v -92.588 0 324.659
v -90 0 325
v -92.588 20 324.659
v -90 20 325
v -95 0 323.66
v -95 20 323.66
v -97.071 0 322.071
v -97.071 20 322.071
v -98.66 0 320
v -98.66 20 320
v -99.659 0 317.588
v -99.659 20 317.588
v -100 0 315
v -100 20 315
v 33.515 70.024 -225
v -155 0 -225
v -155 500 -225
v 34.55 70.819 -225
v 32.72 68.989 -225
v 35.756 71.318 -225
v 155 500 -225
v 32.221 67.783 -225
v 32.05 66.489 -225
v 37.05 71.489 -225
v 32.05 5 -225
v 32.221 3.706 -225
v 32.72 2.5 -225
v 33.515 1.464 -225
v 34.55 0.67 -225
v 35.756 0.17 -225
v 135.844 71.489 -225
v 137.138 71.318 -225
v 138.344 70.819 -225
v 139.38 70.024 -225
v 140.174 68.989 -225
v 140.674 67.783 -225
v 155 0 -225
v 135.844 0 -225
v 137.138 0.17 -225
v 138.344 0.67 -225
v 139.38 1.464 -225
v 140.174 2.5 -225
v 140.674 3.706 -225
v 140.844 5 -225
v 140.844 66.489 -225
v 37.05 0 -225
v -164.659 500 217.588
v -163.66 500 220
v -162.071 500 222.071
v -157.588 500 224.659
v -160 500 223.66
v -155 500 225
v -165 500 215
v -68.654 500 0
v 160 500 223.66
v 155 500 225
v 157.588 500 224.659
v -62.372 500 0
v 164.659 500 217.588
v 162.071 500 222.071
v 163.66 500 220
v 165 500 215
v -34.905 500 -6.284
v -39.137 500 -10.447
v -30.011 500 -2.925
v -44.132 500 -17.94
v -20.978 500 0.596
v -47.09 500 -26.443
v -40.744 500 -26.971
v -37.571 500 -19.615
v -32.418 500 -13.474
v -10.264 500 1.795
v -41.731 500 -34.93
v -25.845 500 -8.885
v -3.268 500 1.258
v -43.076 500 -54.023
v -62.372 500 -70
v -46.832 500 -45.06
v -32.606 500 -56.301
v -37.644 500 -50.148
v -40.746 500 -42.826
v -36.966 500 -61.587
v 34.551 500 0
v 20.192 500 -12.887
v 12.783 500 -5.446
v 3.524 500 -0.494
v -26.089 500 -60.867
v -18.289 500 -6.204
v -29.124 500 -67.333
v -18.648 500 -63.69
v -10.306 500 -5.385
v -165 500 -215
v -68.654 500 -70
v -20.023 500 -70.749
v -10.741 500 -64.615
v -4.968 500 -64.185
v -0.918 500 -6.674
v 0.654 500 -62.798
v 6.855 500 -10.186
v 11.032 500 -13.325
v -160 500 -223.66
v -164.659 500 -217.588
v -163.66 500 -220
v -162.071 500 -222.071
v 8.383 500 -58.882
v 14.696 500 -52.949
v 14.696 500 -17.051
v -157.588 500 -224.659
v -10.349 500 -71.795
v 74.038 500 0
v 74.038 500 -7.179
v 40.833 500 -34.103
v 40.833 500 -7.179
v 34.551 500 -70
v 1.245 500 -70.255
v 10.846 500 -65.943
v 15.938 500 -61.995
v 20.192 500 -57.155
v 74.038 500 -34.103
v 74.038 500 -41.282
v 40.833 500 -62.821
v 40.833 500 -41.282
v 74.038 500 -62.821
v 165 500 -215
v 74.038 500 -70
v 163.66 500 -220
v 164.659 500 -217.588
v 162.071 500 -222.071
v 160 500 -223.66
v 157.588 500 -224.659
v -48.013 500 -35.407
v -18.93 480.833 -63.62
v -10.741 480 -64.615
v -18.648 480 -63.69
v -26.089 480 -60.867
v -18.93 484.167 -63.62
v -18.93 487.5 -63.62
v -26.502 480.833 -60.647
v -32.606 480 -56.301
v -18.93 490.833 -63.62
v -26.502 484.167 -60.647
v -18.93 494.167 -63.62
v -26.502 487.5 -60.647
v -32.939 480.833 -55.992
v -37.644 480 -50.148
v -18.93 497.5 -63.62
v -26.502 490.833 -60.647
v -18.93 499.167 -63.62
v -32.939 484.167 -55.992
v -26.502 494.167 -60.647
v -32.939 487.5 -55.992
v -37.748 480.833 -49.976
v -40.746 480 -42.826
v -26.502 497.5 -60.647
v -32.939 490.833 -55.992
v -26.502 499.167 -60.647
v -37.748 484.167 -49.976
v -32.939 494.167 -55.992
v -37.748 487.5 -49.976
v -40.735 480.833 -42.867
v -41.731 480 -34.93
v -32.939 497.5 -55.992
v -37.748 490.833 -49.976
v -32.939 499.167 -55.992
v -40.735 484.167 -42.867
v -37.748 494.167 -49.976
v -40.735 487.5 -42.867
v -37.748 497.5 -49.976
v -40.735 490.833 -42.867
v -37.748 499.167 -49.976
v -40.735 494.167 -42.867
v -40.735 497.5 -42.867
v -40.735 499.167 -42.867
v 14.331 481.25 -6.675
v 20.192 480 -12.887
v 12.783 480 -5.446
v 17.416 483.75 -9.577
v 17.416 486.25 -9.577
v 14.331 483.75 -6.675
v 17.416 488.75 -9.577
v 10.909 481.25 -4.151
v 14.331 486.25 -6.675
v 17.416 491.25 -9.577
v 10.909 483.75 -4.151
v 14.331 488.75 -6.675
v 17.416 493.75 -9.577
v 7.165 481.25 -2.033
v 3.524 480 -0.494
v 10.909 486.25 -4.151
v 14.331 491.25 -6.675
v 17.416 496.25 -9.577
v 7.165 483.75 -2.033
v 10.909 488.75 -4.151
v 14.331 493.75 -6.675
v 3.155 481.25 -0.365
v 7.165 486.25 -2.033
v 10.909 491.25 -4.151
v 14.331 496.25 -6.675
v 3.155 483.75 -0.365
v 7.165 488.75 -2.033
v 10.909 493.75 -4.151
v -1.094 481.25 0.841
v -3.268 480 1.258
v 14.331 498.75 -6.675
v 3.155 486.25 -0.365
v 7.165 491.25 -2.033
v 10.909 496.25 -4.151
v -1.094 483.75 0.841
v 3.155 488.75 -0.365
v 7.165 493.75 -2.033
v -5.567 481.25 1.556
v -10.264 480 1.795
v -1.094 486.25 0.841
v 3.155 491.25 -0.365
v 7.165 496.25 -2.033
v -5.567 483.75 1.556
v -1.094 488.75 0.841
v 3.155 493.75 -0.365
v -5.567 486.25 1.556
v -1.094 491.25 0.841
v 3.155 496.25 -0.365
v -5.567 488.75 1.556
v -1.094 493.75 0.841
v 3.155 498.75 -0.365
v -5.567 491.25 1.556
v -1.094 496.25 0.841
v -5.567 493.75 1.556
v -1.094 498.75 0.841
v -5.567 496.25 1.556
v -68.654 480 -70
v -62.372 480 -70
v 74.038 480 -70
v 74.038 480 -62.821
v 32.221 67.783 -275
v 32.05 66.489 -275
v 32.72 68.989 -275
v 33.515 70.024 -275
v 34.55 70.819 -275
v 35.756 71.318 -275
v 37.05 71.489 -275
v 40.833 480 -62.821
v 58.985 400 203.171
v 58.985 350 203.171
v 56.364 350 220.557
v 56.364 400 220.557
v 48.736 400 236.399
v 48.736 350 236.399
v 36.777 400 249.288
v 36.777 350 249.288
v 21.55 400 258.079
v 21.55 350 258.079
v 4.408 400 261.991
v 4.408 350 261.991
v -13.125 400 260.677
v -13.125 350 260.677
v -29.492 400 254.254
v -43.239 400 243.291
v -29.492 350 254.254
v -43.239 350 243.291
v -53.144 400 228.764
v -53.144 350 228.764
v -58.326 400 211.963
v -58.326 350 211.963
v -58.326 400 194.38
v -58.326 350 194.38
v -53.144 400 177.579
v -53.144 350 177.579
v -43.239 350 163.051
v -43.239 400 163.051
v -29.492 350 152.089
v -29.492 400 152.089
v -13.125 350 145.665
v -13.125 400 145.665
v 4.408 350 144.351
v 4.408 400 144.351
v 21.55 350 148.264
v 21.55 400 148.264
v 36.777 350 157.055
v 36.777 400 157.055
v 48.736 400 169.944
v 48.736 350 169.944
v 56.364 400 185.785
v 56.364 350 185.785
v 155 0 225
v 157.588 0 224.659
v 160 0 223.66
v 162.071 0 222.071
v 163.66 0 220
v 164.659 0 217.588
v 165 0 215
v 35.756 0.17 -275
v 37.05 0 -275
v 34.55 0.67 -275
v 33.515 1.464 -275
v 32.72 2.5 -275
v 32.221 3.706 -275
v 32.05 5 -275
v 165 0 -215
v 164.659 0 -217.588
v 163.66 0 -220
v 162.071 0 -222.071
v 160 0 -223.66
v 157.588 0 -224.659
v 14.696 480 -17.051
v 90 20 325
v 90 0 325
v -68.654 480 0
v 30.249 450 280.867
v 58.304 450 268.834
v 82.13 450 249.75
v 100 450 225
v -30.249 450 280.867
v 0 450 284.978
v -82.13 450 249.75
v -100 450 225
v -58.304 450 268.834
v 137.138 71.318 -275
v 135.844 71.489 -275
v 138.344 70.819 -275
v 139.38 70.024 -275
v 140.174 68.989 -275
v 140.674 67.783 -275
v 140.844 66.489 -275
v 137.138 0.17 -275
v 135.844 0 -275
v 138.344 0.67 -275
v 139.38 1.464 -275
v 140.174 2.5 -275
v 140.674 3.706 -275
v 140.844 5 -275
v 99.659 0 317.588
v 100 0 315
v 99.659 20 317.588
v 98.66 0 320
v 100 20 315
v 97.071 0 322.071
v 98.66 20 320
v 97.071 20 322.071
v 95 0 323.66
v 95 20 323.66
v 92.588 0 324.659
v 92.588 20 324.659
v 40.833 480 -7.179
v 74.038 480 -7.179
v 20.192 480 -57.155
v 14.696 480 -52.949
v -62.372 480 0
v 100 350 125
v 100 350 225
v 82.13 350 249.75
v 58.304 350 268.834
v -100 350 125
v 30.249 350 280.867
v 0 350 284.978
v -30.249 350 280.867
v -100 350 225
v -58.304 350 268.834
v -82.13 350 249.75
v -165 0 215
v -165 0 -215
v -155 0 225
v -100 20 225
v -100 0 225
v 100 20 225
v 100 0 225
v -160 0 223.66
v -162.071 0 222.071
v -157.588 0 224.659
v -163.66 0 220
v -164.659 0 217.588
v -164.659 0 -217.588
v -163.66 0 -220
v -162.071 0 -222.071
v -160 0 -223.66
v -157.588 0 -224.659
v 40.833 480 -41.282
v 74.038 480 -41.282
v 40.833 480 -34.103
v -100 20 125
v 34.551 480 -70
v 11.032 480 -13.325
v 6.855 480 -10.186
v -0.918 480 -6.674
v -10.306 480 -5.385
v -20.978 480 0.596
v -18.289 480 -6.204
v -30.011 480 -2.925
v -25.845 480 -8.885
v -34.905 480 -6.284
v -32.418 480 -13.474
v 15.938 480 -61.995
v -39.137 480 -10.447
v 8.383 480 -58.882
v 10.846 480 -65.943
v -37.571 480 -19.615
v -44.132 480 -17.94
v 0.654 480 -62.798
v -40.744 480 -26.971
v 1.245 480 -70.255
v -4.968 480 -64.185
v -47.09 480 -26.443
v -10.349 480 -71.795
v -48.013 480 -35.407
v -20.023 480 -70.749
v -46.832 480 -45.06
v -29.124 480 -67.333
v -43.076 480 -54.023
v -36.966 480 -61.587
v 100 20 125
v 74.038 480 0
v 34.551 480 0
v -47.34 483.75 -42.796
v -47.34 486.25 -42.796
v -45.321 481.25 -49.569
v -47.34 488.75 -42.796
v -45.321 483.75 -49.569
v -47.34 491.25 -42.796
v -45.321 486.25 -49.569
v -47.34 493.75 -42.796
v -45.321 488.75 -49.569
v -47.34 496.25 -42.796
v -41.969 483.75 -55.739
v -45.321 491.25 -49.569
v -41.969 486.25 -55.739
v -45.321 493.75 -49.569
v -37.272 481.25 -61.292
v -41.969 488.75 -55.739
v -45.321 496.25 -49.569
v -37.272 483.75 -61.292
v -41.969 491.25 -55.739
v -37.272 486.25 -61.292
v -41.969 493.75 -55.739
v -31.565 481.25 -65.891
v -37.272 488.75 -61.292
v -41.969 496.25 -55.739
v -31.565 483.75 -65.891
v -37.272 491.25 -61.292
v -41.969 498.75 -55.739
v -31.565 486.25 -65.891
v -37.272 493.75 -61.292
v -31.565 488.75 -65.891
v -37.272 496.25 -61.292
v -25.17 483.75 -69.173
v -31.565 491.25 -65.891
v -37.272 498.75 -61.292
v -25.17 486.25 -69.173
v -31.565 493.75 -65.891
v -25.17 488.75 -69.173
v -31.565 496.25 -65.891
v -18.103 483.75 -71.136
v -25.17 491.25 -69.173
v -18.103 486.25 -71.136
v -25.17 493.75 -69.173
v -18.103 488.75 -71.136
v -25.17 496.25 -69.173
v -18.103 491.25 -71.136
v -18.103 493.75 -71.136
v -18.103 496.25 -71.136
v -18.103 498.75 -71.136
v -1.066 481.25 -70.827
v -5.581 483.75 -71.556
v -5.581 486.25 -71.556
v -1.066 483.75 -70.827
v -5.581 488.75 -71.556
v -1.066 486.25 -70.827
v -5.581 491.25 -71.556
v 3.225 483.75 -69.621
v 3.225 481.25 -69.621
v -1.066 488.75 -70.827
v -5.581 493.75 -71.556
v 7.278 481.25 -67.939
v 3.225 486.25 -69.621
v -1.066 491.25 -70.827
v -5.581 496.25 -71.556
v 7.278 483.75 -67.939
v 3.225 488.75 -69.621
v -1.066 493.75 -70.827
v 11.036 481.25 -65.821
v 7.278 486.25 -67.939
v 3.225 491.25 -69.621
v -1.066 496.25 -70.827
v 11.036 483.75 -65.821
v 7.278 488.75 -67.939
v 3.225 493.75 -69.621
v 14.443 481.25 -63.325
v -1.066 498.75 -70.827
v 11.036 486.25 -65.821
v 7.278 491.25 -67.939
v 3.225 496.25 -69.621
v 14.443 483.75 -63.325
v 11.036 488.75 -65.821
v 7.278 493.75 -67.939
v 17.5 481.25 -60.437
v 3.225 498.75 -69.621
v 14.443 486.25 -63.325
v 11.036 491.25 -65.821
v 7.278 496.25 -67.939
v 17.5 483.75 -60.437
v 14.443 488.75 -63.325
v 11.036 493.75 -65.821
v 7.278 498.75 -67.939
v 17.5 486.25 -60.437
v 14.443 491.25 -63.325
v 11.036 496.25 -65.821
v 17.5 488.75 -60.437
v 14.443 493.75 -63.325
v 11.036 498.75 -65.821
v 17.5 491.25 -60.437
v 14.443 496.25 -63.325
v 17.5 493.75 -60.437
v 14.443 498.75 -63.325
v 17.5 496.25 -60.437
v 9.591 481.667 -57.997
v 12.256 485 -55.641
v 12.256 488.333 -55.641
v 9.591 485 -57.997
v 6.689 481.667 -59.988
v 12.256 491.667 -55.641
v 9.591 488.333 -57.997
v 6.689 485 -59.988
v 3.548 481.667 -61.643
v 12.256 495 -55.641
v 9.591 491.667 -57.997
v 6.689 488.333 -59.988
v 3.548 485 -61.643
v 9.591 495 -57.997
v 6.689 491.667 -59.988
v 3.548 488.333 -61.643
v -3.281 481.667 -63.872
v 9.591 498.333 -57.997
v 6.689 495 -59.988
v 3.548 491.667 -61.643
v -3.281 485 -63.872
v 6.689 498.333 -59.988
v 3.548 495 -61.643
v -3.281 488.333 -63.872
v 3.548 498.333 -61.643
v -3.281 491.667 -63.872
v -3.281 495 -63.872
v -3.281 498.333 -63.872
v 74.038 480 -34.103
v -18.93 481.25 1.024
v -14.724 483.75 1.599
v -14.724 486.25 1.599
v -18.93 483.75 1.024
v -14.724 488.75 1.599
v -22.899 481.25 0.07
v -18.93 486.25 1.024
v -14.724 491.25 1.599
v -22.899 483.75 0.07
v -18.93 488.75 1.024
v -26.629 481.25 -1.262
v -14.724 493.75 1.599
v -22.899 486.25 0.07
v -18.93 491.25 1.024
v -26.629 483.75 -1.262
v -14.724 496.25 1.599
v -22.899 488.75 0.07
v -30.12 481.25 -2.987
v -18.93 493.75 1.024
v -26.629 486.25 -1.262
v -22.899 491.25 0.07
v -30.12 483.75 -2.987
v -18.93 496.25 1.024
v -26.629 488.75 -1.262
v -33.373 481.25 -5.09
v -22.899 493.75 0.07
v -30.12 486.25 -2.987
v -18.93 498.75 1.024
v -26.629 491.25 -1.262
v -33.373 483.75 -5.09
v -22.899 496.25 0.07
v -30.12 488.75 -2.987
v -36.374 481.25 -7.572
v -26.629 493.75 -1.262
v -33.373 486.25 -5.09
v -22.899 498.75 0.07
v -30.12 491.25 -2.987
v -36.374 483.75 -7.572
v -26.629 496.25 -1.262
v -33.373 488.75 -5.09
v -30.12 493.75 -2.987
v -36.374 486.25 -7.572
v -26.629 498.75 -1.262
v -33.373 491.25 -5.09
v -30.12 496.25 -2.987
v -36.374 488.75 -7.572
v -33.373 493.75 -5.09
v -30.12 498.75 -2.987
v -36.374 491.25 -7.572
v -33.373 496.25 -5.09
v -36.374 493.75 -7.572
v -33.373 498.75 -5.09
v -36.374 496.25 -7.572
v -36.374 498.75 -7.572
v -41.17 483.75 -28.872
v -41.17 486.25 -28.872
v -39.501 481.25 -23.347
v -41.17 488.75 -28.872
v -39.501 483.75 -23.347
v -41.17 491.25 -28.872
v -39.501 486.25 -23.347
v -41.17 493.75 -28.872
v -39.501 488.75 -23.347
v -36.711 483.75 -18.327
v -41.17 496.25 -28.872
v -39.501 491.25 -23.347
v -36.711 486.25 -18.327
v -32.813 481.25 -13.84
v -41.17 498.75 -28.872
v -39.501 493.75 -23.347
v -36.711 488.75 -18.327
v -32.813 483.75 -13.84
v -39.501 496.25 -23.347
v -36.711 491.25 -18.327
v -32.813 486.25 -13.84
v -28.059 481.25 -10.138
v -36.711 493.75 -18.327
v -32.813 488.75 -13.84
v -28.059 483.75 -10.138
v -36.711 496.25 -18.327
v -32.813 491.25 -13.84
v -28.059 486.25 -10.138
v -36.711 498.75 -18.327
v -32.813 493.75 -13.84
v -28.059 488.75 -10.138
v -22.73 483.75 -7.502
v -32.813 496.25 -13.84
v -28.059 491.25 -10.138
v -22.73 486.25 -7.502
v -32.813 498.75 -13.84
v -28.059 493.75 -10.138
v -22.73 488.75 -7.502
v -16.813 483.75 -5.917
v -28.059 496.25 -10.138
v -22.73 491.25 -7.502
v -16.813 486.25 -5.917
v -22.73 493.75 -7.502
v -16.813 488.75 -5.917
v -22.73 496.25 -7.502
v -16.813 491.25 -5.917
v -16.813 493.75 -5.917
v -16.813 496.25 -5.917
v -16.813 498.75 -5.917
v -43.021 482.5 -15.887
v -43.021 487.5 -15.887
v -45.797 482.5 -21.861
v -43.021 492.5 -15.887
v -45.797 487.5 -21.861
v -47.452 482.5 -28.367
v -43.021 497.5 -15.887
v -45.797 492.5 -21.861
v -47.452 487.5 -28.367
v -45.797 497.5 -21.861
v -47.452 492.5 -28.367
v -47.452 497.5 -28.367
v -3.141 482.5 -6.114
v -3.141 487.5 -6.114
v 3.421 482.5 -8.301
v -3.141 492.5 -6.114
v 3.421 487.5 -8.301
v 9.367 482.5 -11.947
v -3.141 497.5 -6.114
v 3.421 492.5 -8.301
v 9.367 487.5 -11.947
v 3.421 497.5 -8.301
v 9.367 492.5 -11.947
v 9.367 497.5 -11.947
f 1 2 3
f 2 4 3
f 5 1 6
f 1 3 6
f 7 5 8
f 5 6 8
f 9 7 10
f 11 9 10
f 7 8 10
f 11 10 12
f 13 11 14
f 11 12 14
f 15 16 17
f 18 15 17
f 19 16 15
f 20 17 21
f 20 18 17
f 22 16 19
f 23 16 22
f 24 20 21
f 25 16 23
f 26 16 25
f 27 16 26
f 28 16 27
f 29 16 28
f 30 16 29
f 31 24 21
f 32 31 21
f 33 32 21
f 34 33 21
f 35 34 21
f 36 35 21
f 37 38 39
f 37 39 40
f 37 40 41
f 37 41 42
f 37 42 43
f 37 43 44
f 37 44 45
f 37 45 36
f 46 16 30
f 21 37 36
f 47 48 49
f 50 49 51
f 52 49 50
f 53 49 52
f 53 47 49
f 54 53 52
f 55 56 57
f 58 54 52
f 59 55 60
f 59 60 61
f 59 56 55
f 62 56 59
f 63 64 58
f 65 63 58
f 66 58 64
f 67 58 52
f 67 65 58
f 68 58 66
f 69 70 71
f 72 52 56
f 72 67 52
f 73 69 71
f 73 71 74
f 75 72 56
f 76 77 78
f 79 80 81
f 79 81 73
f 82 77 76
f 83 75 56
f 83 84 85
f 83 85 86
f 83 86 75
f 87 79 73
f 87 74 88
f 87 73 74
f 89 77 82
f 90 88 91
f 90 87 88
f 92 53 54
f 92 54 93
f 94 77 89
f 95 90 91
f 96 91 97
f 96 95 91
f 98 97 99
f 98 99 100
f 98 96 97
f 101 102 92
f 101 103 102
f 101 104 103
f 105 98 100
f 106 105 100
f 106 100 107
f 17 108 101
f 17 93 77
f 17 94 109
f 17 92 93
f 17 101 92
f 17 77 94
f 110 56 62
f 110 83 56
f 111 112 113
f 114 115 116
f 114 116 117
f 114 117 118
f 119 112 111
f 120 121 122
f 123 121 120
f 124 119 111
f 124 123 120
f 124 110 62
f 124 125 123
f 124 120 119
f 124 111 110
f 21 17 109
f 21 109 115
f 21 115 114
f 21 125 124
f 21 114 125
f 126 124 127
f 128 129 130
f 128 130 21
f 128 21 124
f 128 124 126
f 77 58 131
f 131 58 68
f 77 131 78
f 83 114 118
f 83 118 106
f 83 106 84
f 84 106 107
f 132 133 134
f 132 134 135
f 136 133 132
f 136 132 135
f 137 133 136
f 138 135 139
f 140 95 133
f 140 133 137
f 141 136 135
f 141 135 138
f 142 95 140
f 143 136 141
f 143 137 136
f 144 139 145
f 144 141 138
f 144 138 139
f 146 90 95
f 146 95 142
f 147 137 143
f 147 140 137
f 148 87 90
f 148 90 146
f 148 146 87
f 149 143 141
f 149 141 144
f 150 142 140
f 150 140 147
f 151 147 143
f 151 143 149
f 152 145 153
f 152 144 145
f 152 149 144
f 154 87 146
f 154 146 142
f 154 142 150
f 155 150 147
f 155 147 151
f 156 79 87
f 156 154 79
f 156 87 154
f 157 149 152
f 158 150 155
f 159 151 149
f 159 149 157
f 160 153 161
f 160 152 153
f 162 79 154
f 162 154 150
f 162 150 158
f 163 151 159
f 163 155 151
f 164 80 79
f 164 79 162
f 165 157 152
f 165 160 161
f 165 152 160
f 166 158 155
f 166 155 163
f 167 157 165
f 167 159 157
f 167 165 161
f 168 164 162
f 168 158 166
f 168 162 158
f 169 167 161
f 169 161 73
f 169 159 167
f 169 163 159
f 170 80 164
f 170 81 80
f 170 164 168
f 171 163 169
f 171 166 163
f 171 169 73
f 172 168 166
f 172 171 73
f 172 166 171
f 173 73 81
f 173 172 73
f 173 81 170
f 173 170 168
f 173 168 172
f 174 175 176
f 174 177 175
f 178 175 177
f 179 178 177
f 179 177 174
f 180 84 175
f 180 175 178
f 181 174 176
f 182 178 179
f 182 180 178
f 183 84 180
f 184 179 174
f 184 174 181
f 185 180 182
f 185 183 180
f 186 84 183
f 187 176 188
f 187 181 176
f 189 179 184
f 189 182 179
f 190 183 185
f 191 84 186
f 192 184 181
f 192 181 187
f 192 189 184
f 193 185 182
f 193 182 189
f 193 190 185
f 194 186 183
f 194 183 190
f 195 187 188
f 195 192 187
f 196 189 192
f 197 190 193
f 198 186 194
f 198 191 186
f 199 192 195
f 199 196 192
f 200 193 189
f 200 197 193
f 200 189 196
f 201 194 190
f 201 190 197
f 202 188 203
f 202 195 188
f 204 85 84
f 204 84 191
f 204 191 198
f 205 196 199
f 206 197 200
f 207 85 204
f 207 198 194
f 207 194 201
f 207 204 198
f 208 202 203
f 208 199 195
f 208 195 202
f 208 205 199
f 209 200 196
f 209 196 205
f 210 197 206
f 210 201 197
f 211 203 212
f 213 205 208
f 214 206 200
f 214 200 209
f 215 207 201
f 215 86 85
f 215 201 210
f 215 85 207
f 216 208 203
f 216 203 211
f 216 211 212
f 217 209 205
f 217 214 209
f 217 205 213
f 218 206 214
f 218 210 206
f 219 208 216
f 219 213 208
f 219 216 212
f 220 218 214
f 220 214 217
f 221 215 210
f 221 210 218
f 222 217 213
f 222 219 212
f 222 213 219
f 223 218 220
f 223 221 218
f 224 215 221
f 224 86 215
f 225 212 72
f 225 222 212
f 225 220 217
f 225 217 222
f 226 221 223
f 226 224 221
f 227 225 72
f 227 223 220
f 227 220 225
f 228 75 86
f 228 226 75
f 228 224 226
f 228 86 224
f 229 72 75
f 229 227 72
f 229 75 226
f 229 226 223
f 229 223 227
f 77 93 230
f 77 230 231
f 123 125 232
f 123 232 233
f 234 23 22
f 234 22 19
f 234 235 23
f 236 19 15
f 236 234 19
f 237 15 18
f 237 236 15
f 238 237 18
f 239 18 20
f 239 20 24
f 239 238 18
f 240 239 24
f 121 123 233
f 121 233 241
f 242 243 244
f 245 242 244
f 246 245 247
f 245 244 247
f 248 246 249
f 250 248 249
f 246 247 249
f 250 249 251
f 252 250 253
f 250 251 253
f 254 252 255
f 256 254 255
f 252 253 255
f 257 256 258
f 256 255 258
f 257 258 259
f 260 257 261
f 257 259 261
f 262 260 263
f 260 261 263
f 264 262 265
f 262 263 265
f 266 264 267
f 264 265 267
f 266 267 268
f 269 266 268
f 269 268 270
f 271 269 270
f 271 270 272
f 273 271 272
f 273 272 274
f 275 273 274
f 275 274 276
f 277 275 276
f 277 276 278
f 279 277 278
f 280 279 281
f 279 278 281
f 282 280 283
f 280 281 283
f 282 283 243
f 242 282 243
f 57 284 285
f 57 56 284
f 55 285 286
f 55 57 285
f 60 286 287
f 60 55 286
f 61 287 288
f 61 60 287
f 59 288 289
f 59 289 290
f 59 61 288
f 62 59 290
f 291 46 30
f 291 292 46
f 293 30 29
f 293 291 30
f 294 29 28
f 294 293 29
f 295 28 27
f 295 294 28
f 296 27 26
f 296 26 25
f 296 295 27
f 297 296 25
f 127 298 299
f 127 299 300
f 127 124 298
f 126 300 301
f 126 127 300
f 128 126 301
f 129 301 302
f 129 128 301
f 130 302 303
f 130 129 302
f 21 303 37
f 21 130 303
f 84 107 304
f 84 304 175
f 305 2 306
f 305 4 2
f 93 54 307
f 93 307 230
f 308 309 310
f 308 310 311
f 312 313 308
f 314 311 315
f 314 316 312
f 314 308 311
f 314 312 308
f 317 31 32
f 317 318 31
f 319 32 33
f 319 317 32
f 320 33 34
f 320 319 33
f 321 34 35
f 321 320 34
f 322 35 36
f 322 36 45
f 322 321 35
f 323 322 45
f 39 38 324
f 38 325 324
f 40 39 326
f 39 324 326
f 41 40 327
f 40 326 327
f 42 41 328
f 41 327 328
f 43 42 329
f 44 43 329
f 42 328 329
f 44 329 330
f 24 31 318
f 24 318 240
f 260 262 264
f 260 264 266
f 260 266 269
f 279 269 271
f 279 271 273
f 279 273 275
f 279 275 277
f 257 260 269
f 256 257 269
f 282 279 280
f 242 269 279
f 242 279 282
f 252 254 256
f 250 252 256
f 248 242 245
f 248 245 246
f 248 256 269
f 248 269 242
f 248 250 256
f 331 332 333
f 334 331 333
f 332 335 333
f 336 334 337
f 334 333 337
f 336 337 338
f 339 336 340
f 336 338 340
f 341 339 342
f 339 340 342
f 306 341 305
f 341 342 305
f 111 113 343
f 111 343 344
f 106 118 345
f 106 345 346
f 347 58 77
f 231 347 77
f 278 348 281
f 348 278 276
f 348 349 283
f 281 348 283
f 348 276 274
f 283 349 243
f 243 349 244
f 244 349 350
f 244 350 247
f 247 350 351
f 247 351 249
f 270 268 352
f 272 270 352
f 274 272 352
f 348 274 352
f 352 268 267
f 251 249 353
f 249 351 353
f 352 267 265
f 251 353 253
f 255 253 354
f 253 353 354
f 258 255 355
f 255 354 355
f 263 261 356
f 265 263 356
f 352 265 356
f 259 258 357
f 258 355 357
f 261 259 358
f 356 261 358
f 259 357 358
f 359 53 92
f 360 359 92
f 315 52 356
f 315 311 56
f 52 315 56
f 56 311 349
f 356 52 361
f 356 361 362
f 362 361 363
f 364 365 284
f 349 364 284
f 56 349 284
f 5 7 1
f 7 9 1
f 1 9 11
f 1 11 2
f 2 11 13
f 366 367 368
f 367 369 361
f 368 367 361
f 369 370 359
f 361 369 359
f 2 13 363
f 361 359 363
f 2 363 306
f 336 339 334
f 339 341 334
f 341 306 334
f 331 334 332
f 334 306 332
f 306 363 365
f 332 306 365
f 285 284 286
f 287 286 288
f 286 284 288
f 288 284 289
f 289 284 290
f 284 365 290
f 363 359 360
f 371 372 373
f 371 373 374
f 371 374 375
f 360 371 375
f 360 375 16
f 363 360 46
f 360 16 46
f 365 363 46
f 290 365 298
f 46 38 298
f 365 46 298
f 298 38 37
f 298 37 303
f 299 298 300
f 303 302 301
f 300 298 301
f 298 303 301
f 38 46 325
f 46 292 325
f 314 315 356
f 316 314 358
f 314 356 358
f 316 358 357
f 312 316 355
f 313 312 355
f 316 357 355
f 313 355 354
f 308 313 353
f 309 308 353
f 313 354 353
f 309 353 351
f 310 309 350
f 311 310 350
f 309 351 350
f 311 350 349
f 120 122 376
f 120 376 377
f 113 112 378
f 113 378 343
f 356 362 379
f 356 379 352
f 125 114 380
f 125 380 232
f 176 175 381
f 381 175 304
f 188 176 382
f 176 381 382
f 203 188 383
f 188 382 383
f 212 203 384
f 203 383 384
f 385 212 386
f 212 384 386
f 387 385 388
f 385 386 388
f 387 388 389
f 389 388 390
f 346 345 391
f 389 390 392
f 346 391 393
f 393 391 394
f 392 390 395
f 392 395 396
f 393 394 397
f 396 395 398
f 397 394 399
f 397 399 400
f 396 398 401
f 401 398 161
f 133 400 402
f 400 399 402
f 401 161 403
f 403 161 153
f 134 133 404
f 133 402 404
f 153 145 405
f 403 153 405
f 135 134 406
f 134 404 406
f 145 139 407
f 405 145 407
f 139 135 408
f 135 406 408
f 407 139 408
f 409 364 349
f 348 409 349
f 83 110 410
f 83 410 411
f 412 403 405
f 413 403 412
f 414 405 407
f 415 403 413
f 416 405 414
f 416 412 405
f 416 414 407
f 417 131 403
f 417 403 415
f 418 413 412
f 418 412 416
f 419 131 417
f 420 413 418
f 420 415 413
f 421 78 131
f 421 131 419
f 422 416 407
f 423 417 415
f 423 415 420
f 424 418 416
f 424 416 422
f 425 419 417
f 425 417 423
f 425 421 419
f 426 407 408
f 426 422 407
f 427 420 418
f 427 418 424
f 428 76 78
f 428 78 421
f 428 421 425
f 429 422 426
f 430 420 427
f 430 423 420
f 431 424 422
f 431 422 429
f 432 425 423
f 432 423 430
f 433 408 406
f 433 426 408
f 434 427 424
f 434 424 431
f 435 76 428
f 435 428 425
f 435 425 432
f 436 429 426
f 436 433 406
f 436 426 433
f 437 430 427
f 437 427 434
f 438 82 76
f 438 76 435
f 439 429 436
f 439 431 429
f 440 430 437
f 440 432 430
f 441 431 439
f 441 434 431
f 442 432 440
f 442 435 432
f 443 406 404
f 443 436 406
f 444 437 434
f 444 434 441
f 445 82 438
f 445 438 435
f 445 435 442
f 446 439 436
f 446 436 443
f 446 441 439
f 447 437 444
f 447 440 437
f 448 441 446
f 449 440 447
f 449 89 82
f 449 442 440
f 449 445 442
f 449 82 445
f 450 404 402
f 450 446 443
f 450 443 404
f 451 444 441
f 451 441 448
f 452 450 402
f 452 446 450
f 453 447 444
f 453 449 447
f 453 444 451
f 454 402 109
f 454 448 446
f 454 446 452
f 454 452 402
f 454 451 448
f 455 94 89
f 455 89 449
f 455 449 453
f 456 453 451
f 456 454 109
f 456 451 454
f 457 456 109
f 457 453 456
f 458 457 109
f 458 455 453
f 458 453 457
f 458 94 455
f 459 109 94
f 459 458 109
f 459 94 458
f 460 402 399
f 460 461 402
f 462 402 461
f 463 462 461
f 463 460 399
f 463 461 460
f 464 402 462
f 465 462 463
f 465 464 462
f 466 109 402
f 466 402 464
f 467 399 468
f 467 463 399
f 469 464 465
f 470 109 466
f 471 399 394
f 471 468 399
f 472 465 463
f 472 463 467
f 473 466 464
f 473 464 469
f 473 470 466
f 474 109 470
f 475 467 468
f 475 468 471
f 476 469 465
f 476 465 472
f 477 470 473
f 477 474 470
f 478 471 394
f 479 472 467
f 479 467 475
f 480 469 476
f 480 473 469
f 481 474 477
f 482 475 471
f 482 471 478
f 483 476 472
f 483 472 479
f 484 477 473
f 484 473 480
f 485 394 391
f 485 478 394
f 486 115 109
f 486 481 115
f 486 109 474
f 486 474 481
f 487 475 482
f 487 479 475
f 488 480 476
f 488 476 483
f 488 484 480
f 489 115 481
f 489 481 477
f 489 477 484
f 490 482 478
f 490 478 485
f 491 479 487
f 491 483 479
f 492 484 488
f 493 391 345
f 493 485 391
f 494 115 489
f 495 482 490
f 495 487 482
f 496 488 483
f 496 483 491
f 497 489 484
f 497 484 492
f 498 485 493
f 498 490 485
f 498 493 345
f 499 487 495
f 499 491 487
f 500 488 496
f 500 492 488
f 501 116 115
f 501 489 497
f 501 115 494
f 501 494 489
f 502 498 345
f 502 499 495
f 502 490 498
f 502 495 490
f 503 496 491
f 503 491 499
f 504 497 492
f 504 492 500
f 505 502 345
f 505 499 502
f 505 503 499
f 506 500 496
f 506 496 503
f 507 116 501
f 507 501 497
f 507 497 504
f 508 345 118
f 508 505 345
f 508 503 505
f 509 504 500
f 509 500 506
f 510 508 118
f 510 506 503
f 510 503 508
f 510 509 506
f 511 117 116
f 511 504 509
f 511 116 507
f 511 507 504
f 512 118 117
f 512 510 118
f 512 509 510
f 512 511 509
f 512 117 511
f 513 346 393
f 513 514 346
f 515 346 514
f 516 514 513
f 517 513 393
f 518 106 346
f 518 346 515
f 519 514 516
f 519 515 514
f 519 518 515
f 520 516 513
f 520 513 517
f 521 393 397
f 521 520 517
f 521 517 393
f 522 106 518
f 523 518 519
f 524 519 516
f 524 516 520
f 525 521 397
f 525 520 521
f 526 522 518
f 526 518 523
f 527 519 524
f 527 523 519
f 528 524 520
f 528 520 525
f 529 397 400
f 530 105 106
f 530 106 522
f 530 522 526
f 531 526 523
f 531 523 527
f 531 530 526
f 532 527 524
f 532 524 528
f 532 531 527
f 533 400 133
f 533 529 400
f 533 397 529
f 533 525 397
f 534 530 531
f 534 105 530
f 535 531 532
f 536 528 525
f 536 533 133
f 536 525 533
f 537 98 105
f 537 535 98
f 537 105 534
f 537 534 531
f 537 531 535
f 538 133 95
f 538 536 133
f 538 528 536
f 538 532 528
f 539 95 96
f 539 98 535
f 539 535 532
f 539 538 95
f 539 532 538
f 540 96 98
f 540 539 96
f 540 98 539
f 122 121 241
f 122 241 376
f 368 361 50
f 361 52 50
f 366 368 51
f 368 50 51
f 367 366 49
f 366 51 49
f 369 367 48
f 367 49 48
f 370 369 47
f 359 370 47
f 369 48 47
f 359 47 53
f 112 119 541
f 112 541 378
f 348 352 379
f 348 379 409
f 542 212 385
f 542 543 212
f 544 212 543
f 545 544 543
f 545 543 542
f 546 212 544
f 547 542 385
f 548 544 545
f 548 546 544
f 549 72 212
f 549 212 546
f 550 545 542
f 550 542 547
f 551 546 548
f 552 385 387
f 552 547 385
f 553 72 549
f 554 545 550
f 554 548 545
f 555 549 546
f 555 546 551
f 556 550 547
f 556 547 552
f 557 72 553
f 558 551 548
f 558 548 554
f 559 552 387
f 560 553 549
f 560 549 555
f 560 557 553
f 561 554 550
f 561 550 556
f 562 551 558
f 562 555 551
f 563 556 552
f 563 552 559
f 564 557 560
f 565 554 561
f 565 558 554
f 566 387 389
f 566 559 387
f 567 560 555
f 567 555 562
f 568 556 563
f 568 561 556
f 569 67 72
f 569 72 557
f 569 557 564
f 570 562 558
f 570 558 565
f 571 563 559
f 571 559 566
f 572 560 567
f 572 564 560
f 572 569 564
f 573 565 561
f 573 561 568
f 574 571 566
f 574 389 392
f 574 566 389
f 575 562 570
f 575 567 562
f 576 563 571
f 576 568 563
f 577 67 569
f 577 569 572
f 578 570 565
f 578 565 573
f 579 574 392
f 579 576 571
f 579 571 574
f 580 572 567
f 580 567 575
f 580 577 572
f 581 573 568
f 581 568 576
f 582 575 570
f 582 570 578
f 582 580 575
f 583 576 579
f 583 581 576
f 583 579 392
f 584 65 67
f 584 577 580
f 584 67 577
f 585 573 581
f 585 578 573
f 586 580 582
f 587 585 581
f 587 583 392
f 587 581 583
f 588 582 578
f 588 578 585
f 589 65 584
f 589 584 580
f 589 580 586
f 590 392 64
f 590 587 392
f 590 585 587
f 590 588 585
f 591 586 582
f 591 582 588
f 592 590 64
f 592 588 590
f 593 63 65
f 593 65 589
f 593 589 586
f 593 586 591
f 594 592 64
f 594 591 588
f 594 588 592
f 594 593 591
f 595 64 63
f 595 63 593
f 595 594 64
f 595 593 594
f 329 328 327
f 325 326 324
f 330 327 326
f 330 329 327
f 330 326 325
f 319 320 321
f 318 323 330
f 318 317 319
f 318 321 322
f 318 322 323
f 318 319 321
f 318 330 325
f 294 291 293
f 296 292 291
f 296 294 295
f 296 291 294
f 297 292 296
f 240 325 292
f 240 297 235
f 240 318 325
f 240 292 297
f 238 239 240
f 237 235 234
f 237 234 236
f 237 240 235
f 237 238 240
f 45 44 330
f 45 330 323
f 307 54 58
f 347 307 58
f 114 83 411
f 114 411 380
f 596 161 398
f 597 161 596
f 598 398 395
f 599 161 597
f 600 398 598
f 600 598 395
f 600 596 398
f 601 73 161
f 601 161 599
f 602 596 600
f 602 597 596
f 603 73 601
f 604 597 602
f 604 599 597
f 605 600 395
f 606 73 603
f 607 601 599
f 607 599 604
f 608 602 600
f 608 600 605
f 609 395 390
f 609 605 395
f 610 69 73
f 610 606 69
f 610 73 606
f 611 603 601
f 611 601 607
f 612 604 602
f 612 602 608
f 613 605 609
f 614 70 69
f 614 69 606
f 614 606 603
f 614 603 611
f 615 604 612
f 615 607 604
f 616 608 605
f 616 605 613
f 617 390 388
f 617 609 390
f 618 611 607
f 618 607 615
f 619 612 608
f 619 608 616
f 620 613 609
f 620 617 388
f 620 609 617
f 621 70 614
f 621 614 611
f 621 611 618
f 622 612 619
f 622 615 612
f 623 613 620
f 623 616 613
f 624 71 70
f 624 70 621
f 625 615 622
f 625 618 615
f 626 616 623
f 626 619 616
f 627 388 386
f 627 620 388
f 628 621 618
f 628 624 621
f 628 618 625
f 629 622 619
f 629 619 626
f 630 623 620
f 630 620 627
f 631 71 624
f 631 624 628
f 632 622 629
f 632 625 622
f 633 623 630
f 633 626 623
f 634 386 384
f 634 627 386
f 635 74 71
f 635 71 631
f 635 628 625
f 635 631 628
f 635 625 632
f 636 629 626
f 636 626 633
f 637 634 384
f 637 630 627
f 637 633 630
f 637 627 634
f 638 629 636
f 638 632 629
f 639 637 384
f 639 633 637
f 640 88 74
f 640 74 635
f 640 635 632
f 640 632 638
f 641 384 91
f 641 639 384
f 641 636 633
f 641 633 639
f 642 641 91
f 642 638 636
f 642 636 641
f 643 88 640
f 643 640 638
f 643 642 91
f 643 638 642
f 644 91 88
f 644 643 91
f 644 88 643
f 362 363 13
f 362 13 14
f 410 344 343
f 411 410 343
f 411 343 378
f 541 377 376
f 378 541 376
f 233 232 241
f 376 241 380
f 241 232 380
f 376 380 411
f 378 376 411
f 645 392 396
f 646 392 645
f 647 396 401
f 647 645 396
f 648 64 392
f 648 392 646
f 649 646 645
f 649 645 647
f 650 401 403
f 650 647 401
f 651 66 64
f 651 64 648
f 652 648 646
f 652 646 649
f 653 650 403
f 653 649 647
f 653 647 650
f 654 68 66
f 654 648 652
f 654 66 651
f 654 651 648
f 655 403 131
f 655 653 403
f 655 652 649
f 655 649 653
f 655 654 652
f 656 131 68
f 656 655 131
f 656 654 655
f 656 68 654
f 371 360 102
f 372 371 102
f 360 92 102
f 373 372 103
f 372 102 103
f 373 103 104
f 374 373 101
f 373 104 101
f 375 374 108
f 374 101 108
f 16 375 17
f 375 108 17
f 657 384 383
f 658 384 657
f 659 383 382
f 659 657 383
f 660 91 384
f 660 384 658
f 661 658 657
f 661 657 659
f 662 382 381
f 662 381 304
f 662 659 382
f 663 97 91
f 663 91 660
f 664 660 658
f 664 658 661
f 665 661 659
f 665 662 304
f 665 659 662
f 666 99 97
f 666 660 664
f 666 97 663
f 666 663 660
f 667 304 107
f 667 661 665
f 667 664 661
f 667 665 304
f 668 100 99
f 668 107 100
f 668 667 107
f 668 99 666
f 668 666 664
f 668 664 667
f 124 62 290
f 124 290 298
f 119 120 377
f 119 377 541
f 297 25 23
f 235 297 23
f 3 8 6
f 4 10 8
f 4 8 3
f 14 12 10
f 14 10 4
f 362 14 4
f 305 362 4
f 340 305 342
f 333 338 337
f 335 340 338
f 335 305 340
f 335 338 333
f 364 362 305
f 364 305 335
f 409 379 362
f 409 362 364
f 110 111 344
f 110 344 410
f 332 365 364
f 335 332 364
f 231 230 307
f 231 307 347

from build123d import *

# Parameters (mm, degrees)
SKETCH1_W           = 330
SKETCH1_H           = 450
BOSS_EXTRUDE1_DEPTH = 500
SKETCH2_W           = 200
SKETCH2_H           = 350
CUT_EXTRUDE1_DEPTH  = 100
BOSS_EXTRUDE2_DEPTH = 100
SKETCH4_W           = 200
SKETCH4_H           = 20
BOSS_EXTRUDE3_DEPTH = 200
SKETCH5_R           = 58.984993577
CUT_EXTRUDE2_DEPTH  = 50
FILLET1_R           = 10
SKETCH6_W           = 108.793875533
SKETCH6_H           = 71.48855694
BOSS_EXTRUDE4_DEPTH = 50
FILLET2_R           = 5
FILLET3_R           = 10
SKETCH7_W           = 6.282051282
SKETCH7_H           = 70
CUT_EXTRUDE3_DEPTH  = 20


with BuildPart() as part:
    # Sketch1 → Boss-Extrude1 (new body)
    with BuildSketch(Plane(origin=(0, 0, 0), x_dir=(1, 0, 0), z_dir=(0, 1, 0))):
        Rectangle(SKETCH1_W, SKETCH1_H)
    extrude(amount=BOSS_EXTRUDE1_DEPTH)

    # Sketch2 → Cut-Extrude1 (cut)
    with BuildSketch(Plane.XY.offset(225)):
        with Locations((0, 175)):
            Rectangle(SKETCH2_W, SKETCH2_H)
    extrude(amount=-CUT_EXTRUDE1_DEPTH, mode=Mode.SUBTRACT)

    # Sketch3 → Boss-Extrude2 (add)
    with BuildSketch(Plane.XZ.offset(-350)):
        with BuildLine():
            Line((100, 225), (-100, 225))
            ThreePointArc((-100, 225), (0, 284.9775435), (100, 225))
        make_face()
    extrude(amount=-BOSS_EXTRUDE2_DEPTH)

    # Sketch4 → Boss-Extrude3 (add)
    with BuildSketch(Plane.XY.offset(125)):
        with Locations((0, 10)):
            Rectangle(SKETCH4_W, SKETCH4_H)
    extrude(amount=BOSS_EXTRUDE3_DEPTH)

    # Sketch5 → Cut-Extrude2 (cut)
    with BuildSketch(Plane.XZ.offset(-350)):
        with Locations((0, 203.171289973)):
            Circle(SKETCH5_R)
    extrude(amount=-CUT_EXTRUDE2_DEPTH, mode=Mode.SUBTRACT)

    # Fillet1
    fillet1_edges = [part.edges().sort_by_distance(p)[0] for p in [
        (165, 250, 225),
        (-165, 250, 225),
        (-165, 250, -225),
        (165, 250, -225),
    ]]
    fillet(fillet1_edges, radius=FILLET1_R)

    # Sketch6 → Boss-Extrude4 (add)
    with BuildSketch(Plane(origin=(0, 0, -225), x_dir=(-1, 0, 0), z_dir=(0, 0, -1))):
        with Locations((-86.447180312, 35.74427847)):
            Rectangle(SKETCH6_W, SKETCH6_H)
    extrude(amount=BOSS_EXTRUDE4_DEPTH)

    # Fillet2
    fillet2_edges = [part.edges().sort_by_distance(p)[0] for p in [
        (140.844118078, 71.48855694, -250),
        (140.844118078, 0, -250),
        (32.050242545, 0, -250),
        (32.050242545, 71.48855694, -250),
    ]]
    fillet(fillet2_edges, radius=FILLET2_R)

    # Fillet3
    fillet3_edges = [part.edges().sort_by_distance(p)[0] for p in [
        (-100, 10, 325),
        (100, 10, 325),
    ]]
    fillet(fillet3_edges, radius=FILLET3_R)

    # Sketch7 → Cut-Extrude3 (cut)
    with BuildSketch(Plane(origin=(0, 500, 0), x_dir=(1, 0, 0), z_dir=(0, 1, 0))):
        with Locations((-65.512820513, 35)):
            Rectangle(SKETCH7_W, SKETCH7_H)
        with BuildLine():
            Line((20.192307692, 57.155448718), (14.695512821, 52.948717949))
            add(Edge.make_bspline(
                [(14.695512821, 52.948717949), (14.303395053, 53.416037345), (13.524446117, 54.34437566), (12.271262066, 55.647966549), (10.965229208, 56.869271778), (9.606846784, 58.01410937), (8.171664394, 59.042444685), (6.694448421, 60.007866744), (5.150487517, 60.873221503), (3.015452824, 61.922481225), (0.222495858, 63.017404325), (-3.293400923, 63.935468951), (-6.963622893, 64.519892465), (-9.467574885, 64.583189294), (-10.741185897, 64.615384615)],
                knots=[0, 0, 0, 0, 0.757959112, 1.505699292, 2.245454638, 2.979532153, 3.711538275, 4.438200793, 5.171680507, 5.909471876, 7.393775596, 8.890124382, 10.418191784, 12, 12, 12, 12], degree=3))
            add(Edge.make_bspline(
                [(-10.741185897, 64.615384615), (-11.442851884, 64.607305365), (-12.839671736, 64.591221848), (-14.912641206, 64.379039344), (-16.946902228, 64.080815143), (-18.941131553, 63.638308678), (-20.892790723, 63.078856297), (-22.814638765, 62.410348018), (-24.678850761, 61.583251221), (-26.511215525, 60.669086022), (-28.266799745, 59.636537127), (-29.9279007, 58.51027009), (-31.488460059, 57.302888161), (-32.949712302, 56.009866033), (-34.313151268, 54.637026824), (-35.568897484, 53.169739992), (-36.71260569, 51.612696522), (-37.766946191, 49.98642837), (-38.711200858, 48.295672538), (-39.501798446, 46.534171129), (-40.20190089, 44.732089068), (-40.755885743, 42.869065852), (-41.194376079, 40.958210535), (-41.496929345, 38.994394776), (-41.706698769, 36.981721184), (-41.722702307, 35.617534932), (-41.730769231, 34.929887821)],
                knots=[0, 0, 0, 0, 1.054917814, 2.100044995, 3.131103042, 4.146048494, 5.169673617, 6.183595914, 7.203665975, 8.234915748, 9.262203917, 10.264457458, 11.251630812, 12.227803204, 13.197192746, 14.159520551, 15.12972552, 16.100847026, 17.073214652, 18.039054194, 19.002613845, 19.979014051, 20.95965708, 21.949030935, 22.966165397, 24, 24, 24, 24], degree=3))
            add(Edge.make_bspline(
                [(-41.730769231, 34.929887821), (-41.70553285, 33.895261422), (-41.655984565, 31.863909725), (-41.215017883, 28.888497514), (-40.544916057, 26.038084039), (-39.540604519, 23.330487192), (-38.302223507, 20.732320031), (-36.737411277, 18.287542963), (-34.92508053, 15.959211673), (-32.839592141, 13.802352718), (-30.551475821, 11.832078212), (-28.096517589, 10.097066582), (-25.480831833, 8.650768932), (-22.73329923, 7.447250002), (-19.832776951, 6.522115449), (-16.784480903, 5.870832979), (-13.595040998, 5.445989368), (-11.415653, 5.405315607), (-10.306490385, 5.384615385)],
                knots=[0, 0, 0, 0, 1.029171465, 2.020641659, 2.987623507, 3.938342917, 4.889210282, 5.84687017, 6.821220943, 7.821438502, 8.827599549, 9.822697543, 10.807740252, 11.797342354, 12.80366471, 13.83203677, 14.896651826, 16, 16, 16, 16], degree=3))
            add(Edge.make_bspline(
                [(-10.306490385, 5.384615385), (-9.084436605, 5.41839098), (-6.679142426, 5.48486943), (-3.1517819, 6.048054413), (0.224933413, 6.96121277), (3.451185144, 8.239171216), (6.517878068, 9.900476974), (9.429811274, 11.914434522), (12.189442684, 14.300201177), (13.848868329, 16.121863743), (14.695512821, 17.051282051)],
                knots=[0, 0, 0, 0, 1.028121516, 2.023589091, 2.998037872, 3.967518031, 4.937445131, 5.927275754, 6.942489185, 8, 8, 8, 8], degree=3))
            Line((14.695512821, 17.051282051), (20.192307692, 12.88661859))
            add(Edge.make_bspline(
                [(20.192307692, 12.88661859), (19.749945495, 12.315849551), (18.867339989, 11.177045426), (17.43817965, 9.571611231), (15.932633702, 8.061530521), (14.339519502, 6.658978097), (12.67716367, 5.335888785), (10.915717423, 4.129852159), (9.078336773, 3.024034474), (7.171247195, 2.011495983), (5.196474939, 1.113151043), (3.15638624, 0.344075687), (1.05977473, -0.318422104), (-1.093455438, -0.863460838), (-3.307770575, -1.288882516), (-5.575180057, -1.573276013), (-7.900577561, -1.768114301), (-9.469405984, -1.785872618), (-10.264423077, -1.794871795)],
                knots=[0, 0, 0, 0, 0.986787822, 1.968848986, 2.935600012, 3.899624008, 4.868462664, 5.837806735, 6.815139263, 7.798259679, 8.787526145, 9.778297419, 10.776456485, 11.791383307, 12.812564526, 13.85620153, 14.913611965, 16, 16, 16, 16], degree=3))
            add(Edge.make_bspline(
                [(-10.264423077, -1.794871795), (-11.017296418, -1.789631944), (-12.50601022, -1.779270787), (-14.703985252, -1.611427439), (-16.843776868, -1.382432701), (-18.919269386, -1.037630079), (-20.941788887, -0.630743278), (-22.893000576, -0.085318146), (-24.792104784, 0.525665186), (-26.631471597, 1.243764921), (-28.412665593, 2.054088572), (-30.129941821, 2.96991975), (-31.782510469, 3.983557043), (-33.386618886, 5.072657252), (-34.918570559, 6.272203289), (-36.391641066, 7.565535979), (-37.814090591, 8.948296194), (-38.694144291, 9.945393261), (-39.13661859, 10.446714744)],
                knots=[0, 0, 0, 0, 1.114604814, 2.203992996, 3.262667896, 4.300477797, 5.318619304, 6.316056647, 7.298880507, 8.271930387, 9.238335007, 10.195173496, 11.151986948, 12.108099108, 13.064862484, 14.031167946, 15.010108607, 16, 16, 16, 16], degree=3))
            add(Edge.make_bspline(
                [(-39.13661859, 10.446714744), (-39.84533146, 11.317538522), (-41.254200996, 13.04867273), (-43.056714667, 15.854392355), (-44.599665772, 18.783756533), (-45.847184187, 21.852155108), (-46.82243885, 25.052702853), (-47.498062752, 28.387013141), (-47.937094841, 31.851971985), (-47.987300617, 34.208707759), (-48.012820513, 35.406650641)],
                knots=[0, 0, 0, 0, 0.994628077, 1.977248131, 2.950237994, 3.925870899, 4.908910175, 5.911660606, 6.938484602, 8, 8, 8, 8], degree=3))
            add(Edge.make_bspline(
                [(-48.012820513, 35.406650641), (-47.981716642, 36.665759712), (-47.920521717, 39.142978203), (-47.400605808, 42.778457269), (-46.564229884, 46.261485246), (-45.376292112, 49.585560138), (-43.870185086, 52.768165742), (-42.009652809, 55.784989839), (-39.816309965, 58.655325832), (-37.307358611, 61.335620858), (-34.556011905, 63.786407911), (-31.609635627, 65.942531986), (-28.473996688, 67.736882306), (-25.183639654, 69.236805554), (-21.713926023, 70.389694817), (-18.07225864, 71.196758551), (-14.265480345, 71.699100877), (-11.668231832, 71.762605035), (-10.348557692, 71.794871795)],
                knots=[0, 0, 0, 0, 1.032925535, 2.032216505, 3.007276963, 3.968222605, 4.92396291, 5.891752235, 6.871517503, 7.883894988, 8.900124299, 9.891468569, 10.874487609, 11.85992873, 12.854644235, 13.869047385, 14.917252991, 16, 16, 16, 16], degree=3))
            add(Edge.make_bspline(
                [(-10.348557692, 71.794871795), (-9.544268253, 71.785229031), (-7.952258307, 71.766142151), (-5.597205259, 71.580019309), (-3.30435872, 71.269747184), (-1.07213908, 70.847425788), (1.110313244, 70.323279359), (3.226318062, 69.640473392), (5.288291799, 68.859742766), (7.283229963, 67.960573447), (9.201560966, 66.951238619), (11.042687336, 65.842926148), (12.79198451, 64.637010038), (14.461761479, 63.34374653), (16.0240857, 61.935775344), (17.523315271, 60.451823425), (18.908536834, 58.849146941), (19.763600734, 57.721048263), (20.192307692, 57.155448718)],
                knots=[0, 0, 0, 0, 1.096760587, 2.17092713, 3.219439832, 4.250915756, 5.268269357, 6.278326846, 7.281116186, 8.274029601, 9.260640565, 10.235837813, 11.203064059, 12.156899882, 13.114053108, 14.069676657, 15.032185724, 16, 16, 16, 16], degree=3))
        make_face()
        Polygon((34.551282051, 70), (74.038461538, 70), (74.038461538, 62.820512821), (40.833333333, 62.820512821), (40.833333333, 41.282051282), (74.038461538, 41.282051282), (74.038461538, 34.102564103), (40.833333333, 34.102564103), (40.833333333, 7.179487179), (74.038461538, 7.179487179), (74.038461538, 0), (34.551282051, 0), align=None)
    extrude(amount=-CUT_EXTRUDE3_DEPTH, mode=Mode.SUBTRACT)


solid = part.part
